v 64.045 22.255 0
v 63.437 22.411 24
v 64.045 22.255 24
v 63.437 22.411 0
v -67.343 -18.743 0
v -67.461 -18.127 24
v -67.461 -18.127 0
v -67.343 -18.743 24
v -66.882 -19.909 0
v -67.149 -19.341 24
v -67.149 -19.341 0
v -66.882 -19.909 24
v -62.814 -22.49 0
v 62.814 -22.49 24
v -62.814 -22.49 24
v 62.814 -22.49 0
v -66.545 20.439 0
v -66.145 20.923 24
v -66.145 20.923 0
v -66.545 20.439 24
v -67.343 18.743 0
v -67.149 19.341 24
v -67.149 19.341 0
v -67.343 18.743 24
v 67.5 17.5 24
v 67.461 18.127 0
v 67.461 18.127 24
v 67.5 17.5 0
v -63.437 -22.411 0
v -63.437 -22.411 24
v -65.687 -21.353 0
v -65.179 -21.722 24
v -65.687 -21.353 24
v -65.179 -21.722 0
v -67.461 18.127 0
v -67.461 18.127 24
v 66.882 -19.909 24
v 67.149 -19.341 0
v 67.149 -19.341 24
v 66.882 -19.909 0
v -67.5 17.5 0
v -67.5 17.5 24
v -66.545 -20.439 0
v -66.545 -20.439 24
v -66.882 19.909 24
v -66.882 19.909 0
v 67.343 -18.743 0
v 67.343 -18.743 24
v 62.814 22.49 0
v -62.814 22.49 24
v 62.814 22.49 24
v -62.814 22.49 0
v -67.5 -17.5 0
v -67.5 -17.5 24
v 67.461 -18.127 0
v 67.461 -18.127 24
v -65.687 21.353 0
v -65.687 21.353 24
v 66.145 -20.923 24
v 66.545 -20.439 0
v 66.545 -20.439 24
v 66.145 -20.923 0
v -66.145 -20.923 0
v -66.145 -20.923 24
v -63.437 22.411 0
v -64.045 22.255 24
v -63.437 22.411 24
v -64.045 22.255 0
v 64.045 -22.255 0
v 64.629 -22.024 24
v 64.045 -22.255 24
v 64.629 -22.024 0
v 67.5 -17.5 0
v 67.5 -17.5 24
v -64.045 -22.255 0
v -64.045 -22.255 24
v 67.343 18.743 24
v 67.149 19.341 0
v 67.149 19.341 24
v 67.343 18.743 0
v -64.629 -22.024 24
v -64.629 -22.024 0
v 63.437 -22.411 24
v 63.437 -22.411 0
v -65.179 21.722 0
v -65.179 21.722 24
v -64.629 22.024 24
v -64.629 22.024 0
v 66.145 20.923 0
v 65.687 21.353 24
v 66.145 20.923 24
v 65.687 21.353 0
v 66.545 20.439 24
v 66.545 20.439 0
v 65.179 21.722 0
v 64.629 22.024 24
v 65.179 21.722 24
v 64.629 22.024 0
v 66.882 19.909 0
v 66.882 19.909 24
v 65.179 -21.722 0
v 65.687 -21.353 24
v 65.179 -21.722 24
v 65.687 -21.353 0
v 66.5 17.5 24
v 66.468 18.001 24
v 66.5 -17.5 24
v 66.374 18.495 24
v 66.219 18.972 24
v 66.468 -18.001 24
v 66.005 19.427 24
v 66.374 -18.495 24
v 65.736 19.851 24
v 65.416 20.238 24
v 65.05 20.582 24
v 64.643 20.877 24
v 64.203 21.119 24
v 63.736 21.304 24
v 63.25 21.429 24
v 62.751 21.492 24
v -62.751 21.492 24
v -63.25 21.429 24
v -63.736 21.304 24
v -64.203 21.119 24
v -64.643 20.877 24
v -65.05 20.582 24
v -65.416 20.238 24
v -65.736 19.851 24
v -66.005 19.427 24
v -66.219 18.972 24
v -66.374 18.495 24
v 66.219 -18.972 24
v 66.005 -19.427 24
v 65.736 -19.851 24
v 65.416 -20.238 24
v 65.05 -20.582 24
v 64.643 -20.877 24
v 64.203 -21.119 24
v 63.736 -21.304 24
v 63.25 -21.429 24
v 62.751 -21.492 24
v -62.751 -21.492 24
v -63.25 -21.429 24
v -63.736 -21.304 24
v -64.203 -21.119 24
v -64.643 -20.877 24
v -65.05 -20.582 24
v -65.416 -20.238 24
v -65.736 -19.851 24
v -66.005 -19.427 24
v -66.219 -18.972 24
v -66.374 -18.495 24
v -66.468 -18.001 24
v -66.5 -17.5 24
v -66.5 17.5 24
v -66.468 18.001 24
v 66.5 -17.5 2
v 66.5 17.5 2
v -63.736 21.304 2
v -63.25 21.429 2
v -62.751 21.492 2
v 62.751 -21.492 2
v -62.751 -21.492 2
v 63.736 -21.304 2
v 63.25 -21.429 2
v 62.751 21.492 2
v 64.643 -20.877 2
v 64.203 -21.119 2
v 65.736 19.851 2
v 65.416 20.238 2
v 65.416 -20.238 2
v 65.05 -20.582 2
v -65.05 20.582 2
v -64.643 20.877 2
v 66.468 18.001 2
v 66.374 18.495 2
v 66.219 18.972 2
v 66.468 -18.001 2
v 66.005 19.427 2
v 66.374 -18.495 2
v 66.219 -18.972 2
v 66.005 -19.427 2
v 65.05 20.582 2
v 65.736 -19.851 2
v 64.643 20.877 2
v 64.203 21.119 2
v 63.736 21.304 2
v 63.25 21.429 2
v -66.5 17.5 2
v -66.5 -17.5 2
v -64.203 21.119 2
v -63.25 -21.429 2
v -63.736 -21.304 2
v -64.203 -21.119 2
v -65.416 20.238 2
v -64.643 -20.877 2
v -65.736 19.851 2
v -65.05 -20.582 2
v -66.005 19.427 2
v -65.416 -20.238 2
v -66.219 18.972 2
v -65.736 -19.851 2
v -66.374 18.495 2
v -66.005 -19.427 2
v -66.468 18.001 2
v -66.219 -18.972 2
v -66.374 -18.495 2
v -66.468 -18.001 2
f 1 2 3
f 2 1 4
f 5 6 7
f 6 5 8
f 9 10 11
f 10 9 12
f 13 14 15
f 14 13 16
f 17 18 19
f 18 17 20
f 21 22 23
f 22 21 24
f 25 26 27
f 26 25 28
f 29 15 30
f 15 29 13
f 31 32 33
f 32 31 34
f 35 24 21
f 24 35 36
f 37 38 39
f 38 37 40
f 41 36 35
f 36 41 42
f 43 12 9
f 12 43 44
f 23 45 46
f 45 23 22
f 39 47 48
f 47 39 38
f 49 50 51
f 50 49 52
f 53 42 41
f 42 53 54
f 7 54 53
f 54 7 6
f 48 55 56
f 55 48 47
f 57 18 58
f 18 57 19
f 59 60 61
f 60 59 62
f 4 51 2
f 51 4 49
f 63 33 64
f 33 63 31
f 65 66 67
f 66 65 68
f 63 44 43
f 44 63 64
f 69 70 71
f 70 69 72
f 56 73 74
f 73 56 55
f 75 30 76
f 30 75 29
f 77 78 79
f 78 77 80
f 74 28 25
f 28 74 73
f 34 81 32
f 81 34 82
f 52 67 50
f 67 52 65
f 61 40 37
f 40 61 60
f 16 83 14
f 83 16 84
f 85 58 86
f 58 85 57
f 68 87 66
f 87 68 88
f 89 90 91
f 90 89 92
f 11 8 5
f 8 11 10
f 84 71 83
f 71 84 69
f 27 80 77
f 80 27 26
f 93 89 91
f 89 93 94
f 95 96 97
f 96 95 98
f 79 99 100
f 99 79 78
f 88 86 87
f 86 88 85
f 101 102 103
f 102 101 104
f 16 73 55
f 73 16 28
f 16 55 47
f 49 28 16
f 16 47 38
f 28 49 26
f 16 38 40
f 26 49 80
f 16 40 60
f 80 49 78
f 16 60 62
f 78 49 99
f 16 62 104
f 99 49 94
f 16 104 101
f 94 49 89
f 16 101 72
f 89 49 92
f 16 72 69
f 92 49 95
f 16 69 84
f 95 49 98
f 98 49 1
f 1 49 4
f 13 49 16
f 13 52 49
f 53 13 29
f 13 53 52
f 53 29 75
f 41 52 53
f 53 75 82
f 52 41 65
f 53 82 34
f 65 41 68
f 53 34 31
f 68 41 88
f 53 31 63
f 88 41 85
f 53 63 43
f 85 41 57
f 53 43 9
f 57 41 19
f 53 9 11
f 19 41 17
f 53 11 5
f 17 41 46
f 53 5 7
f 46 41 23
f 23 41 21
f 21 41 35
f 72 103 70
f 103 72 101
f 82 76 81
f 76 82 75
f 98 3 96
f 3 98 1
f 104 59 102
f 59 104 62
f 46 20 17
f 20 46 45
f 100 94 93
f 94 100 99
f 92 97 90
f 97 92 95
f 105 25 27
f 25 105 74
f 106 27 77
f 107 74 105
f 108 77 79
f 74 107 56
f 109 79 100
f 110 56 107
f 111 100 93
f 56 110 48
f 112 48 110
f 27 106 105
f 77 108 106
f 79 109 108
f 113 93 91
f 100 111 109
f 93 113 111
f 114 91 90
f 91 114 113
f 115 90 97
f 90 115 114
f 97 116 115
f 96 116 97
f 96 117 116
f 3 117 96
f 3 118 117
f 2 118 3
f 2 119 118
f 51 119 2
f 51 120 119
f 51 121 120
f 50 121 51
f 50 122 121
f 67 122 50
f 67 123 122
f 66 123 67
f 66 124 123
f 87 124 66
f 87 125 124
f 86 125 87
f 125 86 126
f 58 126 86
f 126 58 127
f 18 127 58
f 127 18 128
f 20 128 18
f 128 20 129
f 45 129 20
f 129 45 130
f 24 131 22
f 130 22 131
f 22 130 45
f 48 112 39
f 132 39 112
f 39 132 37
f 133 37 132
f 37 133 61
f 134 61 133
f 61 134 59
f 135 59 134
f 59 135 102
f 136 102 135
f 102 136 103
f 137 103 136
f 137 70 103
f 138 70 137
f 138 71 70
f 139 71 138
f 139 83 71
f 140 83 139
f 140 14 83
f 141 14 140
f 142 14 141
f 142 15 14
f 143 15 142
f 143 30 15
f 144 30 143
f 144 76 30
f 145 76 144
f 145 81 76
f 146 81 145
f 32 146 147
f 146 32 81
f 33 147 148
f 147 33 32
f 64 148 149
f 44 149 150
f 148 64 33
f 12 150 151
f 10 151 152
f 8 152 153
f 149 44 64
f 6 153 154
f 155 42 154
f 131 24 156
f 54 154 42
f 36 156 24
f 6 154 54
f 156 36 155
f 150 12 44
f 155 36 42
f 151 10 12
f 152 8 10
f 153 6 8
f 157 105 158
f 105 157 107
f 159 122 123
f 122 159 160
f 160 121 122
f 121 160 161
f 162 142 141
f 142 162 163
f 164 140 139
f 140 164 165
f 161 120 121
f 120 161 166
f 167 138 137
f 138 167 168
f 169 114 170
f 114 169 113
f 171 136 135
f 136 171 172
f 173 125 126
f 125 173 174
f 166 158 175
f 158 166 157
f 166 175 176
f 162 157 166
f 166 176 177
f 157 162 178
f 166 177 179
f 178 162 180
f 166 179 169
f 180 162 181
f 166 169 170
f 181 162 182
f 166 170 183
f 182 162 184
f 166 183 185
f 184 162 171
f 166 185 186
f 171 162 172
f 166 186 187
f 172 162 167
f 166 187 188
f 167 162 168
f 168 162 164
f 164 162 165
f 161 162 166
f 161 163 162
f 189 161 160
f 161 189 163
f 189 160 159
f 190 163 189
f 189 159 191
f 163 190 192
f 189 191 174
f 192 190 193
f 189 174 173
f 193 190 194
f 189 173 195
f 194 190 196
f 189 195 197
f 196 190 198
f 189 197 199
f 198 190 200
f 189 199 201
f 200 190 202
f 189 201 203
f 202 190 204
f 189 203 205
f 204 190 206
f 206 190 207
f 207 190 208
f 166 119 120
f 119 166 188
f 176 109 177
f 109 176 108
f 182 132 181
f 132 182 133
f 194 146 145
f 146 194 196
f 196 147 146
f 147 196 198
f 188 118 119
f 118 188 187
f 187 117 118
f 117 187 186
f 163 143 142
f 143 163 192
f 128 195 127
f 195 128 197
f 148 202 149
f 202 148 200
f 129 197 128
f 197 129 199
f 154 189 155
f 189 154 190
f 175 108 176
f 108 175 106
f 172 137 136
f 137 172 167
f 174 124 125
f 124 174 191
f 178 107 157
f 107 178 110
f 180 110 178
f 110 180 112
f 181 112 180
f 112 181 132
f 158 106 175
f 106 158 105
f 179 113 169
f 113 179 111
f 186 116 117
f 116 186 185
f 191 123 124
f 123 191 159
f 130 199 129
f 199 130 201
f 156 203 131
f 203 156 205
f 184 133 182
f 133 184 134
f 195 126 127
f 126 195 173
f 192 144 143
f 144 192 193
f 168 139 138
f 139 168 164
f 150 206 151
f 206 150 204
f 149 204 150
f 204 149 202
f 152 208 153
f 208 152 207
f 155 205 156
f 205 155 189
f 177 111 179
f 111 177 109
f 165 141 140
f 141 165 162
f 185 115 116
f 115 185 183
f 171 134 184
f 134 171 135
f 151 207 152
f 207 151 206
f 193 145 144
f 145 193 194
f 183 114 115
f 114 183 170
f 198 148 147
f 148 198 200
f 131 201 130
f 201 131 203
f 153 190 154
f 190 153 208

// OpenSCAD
$fn = 50;


difference() {
	union() {
		hull() {
			translate(v = [-62.5000000000, 17.5000000000, 0]) {
				cylinder(h = 24, r = 5);
			}
			translate(v = [62.5000000000, 17.5000000000, 0]) {
				cylinder(h = 24, r = 5);
			}
			translate(v = [-62.5000000000, -17.5000000000, 0]) {
				cylinder(h = 24, r = 5);
			}
			translate(v = [62.5000000000, -17.5000000000, 0]) {
				cylinder(h = 24, r = 5);
			}
		}
	}
	union() {
		translate(v = [0, 0, 2]) {
			hull() {
				translate(v = [-62.5000000000, 17.5000000000, 0]) {
					cylinder(h = 22, r = 4);
				}
				translate(v = [62.5000000000, 17.5000000000, 0]) {
					cylinder(h = 22, r = 4);
				}
				translate(v = [-62.5000000000, -17.5000000000, 0]) {
					cylinder(h = 22, r = 4);
				}
				translate(v = [62.5000000000, -17.5000000000, 0]) {
					cylinder(h = 22, r = 4);
				}
			}
		}
	}
}
